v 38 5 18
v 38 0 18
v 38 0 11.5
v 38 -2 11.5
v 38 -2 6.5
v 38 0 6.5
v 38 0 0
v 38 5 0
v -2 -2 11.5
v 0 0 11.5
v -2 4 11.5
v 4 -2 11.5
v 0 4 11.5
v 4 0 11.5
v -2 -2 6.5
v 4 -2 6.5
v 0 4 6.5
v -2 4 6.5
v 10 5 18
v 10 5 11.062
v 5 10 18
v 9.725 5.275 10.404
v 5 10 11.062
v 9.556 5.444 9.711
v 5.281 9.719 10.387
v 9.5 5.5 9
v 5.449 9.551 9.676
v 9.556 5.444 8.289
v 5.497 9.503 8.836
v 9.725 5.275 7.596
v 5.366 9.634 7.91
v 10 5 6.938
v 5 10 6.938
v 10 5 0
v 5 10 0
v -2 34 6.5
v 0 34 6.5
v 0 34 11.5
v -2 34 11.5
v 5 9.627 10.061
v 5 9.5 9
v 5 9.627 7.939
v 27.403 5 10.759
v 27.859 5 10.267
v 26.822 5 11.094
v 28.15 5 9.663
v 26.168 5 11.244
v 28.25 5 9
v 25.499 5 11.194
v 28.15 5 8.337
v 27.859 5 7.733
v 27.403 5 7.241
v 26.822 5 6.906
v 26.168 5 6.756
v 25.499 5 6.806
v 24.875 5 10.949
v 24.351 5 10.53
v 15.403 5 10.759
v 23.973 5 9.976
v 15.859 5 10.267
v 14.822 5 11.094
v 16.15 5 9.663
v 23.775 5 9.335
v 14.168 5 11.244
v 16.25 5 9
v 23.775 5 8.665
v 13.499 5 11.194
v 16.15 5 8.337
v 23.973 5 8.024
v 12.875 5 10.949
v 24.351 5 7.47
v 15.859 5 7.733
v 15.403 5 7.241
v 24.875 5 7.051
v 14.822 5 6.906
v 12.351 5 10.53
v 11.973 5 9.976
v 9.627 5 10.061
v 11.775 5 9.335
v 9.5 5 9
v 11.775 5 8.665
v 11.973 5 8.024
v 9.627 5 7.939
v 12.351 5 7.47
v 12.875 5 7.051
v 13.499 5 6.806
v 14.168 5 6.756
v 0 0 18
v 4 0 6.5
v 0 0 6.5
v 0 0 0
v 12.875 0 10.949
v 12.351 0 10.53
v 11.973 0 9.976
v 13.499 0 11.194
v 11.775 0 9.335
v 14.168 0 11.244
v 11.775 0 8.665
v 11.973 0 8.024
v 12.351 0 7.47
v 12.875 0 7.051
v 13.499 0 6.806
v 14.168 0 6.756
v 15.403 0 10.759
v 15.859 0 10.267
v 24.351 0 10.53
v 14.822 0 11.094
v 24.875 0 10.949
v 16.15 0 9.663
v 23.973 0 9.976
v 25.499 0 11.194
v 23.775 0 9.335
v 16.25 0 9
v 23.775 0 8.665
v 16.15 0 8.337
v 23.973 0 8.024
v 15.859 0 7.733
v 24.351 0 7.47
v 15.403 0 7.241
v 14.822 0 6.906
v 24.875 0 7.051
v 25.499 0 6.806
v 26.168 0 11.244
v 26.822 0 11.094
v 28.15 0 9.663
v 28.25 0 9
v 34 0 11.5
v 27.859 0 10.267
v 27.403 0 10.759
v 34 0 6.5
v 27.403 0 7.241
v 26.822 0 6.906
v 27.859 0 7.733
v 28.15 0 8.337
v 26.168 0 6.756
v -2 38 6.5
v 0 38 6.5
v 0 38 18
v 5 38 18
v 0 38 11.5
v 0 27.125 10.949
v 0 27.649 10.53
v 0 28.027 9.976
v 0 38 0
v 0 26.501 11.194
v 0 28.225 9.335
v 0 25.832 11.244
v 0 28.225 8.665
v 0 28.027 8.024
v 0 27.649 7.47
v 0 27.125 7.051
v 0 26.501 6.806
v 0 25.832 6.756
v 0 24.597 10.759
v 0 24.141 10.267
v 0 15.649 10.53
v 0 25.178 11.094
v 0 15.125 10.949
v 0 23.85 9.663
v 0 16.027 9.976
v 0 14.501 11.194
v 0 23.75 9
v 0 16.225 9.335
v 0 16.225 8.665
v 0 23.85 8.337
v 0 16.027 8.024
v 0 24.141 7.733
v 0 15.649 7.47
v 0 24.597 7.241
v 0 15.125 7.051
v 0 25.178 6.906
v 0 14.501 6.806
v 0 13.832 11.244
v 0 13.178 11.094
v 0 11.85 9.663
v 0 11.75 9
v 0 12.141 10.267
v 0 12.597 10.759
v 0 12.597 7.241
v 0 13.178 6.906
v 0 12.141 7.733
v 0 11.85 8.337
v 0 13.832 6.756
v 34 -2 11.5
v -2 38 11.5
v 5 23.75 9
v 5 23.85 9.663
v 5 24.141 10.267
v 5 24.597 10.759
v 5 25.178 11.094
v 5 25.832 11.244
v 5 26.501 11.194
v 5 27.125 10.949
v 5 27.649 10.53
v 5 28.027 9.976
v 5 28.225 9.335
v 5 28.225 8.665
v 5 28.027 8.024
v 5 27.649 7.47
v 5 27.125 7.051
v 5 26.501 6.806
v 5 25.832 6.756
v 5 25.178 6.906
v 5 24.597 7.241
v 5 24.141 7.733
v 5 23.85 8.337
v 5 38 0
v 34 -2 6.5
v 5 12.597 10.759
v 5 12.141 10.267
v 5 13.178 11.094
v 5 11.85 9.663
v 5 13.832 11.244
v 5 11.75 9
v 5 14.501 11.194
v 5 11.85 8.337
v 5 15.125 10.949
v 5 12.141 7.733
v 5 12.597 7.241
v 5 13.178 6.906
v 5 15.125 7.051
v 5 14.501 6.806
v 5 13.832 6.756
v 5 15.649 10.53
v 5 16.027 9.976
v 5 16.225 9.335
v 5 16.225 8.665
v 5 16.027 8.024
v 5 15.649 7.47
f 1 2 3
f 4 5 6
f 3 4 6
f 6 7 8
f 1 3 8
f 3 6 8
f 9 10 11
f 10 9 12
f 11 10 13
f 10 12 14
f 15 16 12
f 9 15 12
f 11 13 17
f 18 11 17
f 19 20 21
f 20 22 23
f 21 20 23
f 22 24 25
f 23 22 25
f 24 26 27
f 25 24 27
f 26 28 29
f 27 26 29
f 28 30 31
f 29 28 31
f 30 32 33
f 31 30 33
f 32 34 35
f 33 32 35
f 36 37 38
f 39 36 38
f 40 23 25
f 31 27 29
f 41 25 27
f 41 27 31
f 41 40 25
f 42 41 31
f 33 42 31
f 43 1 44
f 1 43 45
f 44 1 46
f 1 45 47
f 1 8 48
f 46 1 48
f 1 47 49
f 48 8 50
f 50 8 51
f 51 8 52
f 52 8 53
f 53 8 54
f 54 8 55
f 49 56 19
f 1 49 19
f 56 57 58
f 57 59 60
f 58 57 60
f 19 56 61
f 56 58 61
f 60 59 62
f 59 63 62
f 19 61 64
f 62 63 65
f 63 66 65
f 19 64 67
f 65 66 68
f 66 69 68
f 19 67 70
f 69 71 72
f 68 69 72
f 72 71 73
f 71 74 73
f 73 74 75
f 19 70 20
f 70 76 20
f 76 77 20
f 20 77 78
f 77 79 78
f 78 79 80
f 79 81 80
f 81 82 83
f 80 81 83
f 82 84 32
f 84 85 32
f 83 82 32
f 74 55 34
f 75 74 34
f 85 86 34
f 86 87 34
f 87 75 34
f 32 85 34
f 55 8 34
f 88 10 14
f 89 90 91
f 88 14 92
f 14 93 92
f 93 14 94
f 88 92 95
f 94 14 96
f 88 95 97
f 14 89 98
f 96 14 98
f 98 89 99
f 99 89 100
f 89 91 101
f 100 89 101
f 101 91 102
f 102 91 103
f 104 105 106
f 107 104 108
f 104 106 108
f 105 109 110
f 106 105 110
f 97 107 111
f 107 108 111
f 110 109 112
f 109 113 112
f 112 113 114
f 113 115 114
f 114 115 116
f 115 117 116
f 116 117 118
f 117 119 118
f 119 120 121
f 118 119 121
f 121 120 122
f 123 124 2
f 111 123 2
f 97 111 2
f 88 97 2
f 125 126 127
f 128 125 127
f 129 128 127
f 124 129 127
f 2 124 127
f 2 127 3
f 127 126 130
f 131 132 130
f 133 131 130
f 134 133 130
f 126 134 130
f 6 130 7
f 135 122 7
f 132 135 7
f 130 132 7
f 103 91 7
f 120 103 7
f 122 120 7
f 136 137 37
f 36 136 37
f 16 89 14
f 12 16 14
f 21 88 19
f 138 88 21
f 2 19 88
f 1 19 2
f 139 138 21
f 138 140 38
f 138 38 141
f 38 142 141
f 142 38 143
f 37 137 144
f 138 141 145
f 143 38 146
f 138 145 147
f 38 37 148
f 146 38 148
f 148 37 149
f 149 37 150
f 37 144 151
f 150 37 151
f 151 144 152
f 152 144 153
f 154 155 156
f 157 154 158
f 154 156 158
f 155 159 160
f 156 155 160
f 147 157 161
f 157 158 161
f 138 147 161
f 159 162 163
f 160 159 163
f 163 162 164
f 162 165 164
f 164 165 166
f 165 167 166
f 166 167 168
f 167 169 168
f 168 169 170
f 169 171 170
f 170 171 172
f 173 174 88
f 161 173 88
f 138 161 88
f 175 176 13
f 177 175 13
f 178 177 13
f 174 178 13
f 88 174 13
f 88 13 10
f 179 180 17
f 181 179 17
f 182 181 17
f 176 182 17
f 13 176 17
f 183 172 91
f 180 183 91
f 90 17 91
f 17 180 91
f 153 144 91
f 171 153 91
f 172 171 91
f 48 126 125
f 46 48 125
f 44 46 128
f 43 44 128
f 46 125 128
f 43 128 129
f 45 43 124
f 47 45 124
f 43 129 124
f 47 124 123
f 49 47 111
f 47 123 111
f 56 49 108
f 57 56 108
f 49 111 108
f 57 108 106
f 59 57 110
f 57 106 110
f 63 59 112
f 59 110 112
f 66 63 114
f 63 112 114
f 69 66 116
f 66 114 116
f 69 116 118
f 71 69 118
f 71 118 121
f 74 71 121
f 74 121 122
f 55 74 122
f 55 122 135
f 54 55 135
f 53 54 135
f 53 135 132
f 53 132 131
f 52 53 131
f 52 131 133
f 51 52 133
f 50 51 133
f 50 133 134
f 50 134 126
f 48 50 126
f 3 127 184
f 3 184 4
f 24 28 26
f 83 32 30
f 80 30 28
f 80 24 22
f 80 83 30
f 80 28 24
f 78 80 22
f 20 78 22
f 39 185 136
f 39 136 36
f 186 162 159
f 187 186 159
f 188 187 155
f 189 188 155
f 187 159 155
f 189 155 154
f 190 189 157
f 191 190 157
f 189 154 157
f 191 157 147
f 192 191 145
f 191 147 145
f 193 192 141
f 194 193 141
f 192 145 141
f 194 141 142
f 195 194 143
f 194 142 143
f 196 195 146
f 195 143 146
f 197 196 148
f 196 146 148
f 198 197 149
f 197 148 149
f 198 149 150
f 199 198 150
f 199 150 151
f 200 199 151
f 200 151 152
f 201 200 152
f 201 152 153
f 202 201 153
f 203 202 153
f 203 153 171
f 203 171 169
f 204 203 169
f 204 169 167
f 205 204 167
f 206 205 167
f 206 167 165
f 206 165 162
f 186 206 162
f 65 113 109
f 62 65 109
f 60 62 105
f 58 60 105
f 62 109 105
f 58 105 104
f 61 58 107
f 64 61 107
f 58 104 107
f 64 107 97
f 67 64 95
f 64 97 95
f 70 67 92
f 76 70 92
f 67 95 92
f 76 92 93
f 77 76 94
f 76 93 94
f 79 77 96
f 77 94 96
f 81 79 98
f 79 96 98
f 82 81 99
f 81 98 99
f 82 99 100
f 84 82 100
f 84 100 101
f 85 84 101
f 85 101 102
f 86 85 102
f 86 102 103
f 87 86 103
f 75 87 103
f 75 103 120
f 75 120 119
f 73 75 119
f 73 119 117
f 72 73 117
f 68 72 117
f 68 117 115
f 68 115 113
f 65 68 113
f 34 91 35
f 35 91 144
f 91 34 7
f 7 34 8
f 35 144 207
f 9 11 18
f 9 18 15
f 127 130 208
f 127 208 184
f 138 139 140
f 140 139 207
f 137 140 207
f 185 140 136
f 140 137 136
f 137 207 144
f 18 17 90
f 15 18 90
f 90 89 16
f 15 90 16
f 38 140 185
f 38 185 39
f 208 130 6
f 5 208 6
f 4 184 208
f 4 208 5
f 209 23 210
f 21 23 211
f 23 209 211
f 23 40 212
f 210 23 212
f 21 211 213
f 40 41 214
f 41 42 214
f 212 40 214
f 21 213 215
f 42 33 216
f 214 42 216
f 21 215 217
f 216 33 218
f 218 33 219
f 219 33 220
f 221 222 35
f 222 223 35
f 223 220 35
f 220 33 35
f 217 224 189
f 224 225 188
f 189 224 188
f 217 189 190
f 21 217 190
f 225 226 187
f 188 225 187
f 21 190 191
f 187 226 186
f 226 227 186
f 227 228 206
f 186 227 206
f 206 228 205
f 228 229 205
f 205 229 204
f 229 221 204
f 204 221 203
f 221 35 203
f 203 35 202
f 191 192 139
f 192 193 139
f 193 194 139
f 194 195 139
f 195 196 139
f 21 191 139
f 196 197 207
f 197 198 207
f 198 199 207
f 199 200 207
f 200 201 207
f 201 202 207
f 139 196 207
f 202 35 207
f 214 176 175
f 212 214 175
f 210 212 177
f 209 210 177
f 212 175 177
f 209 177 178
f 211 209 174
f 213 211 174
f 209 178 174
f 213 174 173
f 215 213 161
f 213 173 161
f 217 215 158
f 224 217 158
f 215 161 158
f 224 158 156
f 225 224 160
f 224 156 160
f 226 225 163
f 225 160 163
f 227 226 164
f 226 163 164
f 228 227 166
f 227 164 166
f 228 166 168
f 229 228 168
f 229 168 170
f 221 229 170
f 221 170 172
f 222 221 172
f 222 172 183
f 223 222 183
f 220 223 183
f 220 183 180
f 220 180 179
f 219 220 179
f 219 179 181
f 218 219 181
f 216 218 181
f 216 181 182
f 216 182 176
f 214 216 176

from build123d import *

# Parameters (mm, degrees)
F1_DEPTH  = 18
F2_W      = 4
F2_H      = 5
F3_DEPTH  = 2
F2_R      = 2.25
F4_DEPTH  = 25
F5_R      = 4.5
F6_DEPTH  = 25
F7_R      = 2.25
F8_DEPTH  = 25
F7_W      = 4
F7_H      = 5
F9_DEPTH  = 2
F10_R     = 4.5
F11_DEPTH = 25


with BuildPart() as f1:
    # F0 (on Top) → F1 (new body)
    with BuildSketch(Plane.XY):
        Polygon((0, 38), (0, 0), (38, 0), (38, 5), (10, 5), (5, 10), (5, 38), align=None)
    extrude(amount=F1_DEPTH)

    # F2 (on face) → F3 (join)
    with BuildSketch(Plane.XZ):
        with Locations((2, 9)):
            Rectangle(F2_W, F2_H)
        with Locations((36, 9)):
            Rectangle(F2_W, F2_H)
    extrude(amount=F3_DEPTH)

    # F2 (on face) → F4 (cut)
    with BuildSketch(Plane.XZ):
        with Locations((14, 9)):
            Circle(F2_R)
        with Locations((26, 9)):
            Circle(F2_R)
    extrude(amount=-F4_DEPTH, mode=Mode.SUBTRACT)

    # F5 (on face) → F6 (cut)
    with BuildSketch(Plane(origin=(0, 5, 0), x_dir=(-1, 0, 0), z_dir=(0, 1, 0))):
        with Locations((-14, 9)):
            Circle(F5_R)
    extrude(amount=F6_DEPTH, mode=Mode.SUBTRACT)

    # F7 (on face) → F8 (cut)
    with BuildSketch(Plane(origin=(0, 0, 0), x_dir=(0, -1, 0), z_dir=(-1, 0, 0))):
        with Locations((-14, 9)):
            Circle(F7_R)
        with Locations((-26, 9)):
            Circle(F7_R)
    extrude(amount=-F8_DEPTH, mode=Mode.SUBTRACT)

    # F7 (on face) → F9 (join)
    with BuildSketch(Plane(origin=(0, 0, 0), x_dir=(0, -1, 0), z_dir=(-1, 0, 0))):
        Polygon((2, 6.5), (2, 11.5), (0, 11.5), (-4, 11.5), (-4, 6.5), (0, 6.5), align=None)
        with Locations((-36, 9)):
            Rectangle(F7_W, F7_H)
    extrude(amount=F9_DEPTH)

    # F10 (on face) → F11 (cut)
    with BuildSketch(Plane.YZ.offset(5)):
        with Locations((14, 9)):
            Circle(F10_R)
    extrude(amount=F11_DEPTH, mode=Mode.SUBTRACT)


solid = f1.part
